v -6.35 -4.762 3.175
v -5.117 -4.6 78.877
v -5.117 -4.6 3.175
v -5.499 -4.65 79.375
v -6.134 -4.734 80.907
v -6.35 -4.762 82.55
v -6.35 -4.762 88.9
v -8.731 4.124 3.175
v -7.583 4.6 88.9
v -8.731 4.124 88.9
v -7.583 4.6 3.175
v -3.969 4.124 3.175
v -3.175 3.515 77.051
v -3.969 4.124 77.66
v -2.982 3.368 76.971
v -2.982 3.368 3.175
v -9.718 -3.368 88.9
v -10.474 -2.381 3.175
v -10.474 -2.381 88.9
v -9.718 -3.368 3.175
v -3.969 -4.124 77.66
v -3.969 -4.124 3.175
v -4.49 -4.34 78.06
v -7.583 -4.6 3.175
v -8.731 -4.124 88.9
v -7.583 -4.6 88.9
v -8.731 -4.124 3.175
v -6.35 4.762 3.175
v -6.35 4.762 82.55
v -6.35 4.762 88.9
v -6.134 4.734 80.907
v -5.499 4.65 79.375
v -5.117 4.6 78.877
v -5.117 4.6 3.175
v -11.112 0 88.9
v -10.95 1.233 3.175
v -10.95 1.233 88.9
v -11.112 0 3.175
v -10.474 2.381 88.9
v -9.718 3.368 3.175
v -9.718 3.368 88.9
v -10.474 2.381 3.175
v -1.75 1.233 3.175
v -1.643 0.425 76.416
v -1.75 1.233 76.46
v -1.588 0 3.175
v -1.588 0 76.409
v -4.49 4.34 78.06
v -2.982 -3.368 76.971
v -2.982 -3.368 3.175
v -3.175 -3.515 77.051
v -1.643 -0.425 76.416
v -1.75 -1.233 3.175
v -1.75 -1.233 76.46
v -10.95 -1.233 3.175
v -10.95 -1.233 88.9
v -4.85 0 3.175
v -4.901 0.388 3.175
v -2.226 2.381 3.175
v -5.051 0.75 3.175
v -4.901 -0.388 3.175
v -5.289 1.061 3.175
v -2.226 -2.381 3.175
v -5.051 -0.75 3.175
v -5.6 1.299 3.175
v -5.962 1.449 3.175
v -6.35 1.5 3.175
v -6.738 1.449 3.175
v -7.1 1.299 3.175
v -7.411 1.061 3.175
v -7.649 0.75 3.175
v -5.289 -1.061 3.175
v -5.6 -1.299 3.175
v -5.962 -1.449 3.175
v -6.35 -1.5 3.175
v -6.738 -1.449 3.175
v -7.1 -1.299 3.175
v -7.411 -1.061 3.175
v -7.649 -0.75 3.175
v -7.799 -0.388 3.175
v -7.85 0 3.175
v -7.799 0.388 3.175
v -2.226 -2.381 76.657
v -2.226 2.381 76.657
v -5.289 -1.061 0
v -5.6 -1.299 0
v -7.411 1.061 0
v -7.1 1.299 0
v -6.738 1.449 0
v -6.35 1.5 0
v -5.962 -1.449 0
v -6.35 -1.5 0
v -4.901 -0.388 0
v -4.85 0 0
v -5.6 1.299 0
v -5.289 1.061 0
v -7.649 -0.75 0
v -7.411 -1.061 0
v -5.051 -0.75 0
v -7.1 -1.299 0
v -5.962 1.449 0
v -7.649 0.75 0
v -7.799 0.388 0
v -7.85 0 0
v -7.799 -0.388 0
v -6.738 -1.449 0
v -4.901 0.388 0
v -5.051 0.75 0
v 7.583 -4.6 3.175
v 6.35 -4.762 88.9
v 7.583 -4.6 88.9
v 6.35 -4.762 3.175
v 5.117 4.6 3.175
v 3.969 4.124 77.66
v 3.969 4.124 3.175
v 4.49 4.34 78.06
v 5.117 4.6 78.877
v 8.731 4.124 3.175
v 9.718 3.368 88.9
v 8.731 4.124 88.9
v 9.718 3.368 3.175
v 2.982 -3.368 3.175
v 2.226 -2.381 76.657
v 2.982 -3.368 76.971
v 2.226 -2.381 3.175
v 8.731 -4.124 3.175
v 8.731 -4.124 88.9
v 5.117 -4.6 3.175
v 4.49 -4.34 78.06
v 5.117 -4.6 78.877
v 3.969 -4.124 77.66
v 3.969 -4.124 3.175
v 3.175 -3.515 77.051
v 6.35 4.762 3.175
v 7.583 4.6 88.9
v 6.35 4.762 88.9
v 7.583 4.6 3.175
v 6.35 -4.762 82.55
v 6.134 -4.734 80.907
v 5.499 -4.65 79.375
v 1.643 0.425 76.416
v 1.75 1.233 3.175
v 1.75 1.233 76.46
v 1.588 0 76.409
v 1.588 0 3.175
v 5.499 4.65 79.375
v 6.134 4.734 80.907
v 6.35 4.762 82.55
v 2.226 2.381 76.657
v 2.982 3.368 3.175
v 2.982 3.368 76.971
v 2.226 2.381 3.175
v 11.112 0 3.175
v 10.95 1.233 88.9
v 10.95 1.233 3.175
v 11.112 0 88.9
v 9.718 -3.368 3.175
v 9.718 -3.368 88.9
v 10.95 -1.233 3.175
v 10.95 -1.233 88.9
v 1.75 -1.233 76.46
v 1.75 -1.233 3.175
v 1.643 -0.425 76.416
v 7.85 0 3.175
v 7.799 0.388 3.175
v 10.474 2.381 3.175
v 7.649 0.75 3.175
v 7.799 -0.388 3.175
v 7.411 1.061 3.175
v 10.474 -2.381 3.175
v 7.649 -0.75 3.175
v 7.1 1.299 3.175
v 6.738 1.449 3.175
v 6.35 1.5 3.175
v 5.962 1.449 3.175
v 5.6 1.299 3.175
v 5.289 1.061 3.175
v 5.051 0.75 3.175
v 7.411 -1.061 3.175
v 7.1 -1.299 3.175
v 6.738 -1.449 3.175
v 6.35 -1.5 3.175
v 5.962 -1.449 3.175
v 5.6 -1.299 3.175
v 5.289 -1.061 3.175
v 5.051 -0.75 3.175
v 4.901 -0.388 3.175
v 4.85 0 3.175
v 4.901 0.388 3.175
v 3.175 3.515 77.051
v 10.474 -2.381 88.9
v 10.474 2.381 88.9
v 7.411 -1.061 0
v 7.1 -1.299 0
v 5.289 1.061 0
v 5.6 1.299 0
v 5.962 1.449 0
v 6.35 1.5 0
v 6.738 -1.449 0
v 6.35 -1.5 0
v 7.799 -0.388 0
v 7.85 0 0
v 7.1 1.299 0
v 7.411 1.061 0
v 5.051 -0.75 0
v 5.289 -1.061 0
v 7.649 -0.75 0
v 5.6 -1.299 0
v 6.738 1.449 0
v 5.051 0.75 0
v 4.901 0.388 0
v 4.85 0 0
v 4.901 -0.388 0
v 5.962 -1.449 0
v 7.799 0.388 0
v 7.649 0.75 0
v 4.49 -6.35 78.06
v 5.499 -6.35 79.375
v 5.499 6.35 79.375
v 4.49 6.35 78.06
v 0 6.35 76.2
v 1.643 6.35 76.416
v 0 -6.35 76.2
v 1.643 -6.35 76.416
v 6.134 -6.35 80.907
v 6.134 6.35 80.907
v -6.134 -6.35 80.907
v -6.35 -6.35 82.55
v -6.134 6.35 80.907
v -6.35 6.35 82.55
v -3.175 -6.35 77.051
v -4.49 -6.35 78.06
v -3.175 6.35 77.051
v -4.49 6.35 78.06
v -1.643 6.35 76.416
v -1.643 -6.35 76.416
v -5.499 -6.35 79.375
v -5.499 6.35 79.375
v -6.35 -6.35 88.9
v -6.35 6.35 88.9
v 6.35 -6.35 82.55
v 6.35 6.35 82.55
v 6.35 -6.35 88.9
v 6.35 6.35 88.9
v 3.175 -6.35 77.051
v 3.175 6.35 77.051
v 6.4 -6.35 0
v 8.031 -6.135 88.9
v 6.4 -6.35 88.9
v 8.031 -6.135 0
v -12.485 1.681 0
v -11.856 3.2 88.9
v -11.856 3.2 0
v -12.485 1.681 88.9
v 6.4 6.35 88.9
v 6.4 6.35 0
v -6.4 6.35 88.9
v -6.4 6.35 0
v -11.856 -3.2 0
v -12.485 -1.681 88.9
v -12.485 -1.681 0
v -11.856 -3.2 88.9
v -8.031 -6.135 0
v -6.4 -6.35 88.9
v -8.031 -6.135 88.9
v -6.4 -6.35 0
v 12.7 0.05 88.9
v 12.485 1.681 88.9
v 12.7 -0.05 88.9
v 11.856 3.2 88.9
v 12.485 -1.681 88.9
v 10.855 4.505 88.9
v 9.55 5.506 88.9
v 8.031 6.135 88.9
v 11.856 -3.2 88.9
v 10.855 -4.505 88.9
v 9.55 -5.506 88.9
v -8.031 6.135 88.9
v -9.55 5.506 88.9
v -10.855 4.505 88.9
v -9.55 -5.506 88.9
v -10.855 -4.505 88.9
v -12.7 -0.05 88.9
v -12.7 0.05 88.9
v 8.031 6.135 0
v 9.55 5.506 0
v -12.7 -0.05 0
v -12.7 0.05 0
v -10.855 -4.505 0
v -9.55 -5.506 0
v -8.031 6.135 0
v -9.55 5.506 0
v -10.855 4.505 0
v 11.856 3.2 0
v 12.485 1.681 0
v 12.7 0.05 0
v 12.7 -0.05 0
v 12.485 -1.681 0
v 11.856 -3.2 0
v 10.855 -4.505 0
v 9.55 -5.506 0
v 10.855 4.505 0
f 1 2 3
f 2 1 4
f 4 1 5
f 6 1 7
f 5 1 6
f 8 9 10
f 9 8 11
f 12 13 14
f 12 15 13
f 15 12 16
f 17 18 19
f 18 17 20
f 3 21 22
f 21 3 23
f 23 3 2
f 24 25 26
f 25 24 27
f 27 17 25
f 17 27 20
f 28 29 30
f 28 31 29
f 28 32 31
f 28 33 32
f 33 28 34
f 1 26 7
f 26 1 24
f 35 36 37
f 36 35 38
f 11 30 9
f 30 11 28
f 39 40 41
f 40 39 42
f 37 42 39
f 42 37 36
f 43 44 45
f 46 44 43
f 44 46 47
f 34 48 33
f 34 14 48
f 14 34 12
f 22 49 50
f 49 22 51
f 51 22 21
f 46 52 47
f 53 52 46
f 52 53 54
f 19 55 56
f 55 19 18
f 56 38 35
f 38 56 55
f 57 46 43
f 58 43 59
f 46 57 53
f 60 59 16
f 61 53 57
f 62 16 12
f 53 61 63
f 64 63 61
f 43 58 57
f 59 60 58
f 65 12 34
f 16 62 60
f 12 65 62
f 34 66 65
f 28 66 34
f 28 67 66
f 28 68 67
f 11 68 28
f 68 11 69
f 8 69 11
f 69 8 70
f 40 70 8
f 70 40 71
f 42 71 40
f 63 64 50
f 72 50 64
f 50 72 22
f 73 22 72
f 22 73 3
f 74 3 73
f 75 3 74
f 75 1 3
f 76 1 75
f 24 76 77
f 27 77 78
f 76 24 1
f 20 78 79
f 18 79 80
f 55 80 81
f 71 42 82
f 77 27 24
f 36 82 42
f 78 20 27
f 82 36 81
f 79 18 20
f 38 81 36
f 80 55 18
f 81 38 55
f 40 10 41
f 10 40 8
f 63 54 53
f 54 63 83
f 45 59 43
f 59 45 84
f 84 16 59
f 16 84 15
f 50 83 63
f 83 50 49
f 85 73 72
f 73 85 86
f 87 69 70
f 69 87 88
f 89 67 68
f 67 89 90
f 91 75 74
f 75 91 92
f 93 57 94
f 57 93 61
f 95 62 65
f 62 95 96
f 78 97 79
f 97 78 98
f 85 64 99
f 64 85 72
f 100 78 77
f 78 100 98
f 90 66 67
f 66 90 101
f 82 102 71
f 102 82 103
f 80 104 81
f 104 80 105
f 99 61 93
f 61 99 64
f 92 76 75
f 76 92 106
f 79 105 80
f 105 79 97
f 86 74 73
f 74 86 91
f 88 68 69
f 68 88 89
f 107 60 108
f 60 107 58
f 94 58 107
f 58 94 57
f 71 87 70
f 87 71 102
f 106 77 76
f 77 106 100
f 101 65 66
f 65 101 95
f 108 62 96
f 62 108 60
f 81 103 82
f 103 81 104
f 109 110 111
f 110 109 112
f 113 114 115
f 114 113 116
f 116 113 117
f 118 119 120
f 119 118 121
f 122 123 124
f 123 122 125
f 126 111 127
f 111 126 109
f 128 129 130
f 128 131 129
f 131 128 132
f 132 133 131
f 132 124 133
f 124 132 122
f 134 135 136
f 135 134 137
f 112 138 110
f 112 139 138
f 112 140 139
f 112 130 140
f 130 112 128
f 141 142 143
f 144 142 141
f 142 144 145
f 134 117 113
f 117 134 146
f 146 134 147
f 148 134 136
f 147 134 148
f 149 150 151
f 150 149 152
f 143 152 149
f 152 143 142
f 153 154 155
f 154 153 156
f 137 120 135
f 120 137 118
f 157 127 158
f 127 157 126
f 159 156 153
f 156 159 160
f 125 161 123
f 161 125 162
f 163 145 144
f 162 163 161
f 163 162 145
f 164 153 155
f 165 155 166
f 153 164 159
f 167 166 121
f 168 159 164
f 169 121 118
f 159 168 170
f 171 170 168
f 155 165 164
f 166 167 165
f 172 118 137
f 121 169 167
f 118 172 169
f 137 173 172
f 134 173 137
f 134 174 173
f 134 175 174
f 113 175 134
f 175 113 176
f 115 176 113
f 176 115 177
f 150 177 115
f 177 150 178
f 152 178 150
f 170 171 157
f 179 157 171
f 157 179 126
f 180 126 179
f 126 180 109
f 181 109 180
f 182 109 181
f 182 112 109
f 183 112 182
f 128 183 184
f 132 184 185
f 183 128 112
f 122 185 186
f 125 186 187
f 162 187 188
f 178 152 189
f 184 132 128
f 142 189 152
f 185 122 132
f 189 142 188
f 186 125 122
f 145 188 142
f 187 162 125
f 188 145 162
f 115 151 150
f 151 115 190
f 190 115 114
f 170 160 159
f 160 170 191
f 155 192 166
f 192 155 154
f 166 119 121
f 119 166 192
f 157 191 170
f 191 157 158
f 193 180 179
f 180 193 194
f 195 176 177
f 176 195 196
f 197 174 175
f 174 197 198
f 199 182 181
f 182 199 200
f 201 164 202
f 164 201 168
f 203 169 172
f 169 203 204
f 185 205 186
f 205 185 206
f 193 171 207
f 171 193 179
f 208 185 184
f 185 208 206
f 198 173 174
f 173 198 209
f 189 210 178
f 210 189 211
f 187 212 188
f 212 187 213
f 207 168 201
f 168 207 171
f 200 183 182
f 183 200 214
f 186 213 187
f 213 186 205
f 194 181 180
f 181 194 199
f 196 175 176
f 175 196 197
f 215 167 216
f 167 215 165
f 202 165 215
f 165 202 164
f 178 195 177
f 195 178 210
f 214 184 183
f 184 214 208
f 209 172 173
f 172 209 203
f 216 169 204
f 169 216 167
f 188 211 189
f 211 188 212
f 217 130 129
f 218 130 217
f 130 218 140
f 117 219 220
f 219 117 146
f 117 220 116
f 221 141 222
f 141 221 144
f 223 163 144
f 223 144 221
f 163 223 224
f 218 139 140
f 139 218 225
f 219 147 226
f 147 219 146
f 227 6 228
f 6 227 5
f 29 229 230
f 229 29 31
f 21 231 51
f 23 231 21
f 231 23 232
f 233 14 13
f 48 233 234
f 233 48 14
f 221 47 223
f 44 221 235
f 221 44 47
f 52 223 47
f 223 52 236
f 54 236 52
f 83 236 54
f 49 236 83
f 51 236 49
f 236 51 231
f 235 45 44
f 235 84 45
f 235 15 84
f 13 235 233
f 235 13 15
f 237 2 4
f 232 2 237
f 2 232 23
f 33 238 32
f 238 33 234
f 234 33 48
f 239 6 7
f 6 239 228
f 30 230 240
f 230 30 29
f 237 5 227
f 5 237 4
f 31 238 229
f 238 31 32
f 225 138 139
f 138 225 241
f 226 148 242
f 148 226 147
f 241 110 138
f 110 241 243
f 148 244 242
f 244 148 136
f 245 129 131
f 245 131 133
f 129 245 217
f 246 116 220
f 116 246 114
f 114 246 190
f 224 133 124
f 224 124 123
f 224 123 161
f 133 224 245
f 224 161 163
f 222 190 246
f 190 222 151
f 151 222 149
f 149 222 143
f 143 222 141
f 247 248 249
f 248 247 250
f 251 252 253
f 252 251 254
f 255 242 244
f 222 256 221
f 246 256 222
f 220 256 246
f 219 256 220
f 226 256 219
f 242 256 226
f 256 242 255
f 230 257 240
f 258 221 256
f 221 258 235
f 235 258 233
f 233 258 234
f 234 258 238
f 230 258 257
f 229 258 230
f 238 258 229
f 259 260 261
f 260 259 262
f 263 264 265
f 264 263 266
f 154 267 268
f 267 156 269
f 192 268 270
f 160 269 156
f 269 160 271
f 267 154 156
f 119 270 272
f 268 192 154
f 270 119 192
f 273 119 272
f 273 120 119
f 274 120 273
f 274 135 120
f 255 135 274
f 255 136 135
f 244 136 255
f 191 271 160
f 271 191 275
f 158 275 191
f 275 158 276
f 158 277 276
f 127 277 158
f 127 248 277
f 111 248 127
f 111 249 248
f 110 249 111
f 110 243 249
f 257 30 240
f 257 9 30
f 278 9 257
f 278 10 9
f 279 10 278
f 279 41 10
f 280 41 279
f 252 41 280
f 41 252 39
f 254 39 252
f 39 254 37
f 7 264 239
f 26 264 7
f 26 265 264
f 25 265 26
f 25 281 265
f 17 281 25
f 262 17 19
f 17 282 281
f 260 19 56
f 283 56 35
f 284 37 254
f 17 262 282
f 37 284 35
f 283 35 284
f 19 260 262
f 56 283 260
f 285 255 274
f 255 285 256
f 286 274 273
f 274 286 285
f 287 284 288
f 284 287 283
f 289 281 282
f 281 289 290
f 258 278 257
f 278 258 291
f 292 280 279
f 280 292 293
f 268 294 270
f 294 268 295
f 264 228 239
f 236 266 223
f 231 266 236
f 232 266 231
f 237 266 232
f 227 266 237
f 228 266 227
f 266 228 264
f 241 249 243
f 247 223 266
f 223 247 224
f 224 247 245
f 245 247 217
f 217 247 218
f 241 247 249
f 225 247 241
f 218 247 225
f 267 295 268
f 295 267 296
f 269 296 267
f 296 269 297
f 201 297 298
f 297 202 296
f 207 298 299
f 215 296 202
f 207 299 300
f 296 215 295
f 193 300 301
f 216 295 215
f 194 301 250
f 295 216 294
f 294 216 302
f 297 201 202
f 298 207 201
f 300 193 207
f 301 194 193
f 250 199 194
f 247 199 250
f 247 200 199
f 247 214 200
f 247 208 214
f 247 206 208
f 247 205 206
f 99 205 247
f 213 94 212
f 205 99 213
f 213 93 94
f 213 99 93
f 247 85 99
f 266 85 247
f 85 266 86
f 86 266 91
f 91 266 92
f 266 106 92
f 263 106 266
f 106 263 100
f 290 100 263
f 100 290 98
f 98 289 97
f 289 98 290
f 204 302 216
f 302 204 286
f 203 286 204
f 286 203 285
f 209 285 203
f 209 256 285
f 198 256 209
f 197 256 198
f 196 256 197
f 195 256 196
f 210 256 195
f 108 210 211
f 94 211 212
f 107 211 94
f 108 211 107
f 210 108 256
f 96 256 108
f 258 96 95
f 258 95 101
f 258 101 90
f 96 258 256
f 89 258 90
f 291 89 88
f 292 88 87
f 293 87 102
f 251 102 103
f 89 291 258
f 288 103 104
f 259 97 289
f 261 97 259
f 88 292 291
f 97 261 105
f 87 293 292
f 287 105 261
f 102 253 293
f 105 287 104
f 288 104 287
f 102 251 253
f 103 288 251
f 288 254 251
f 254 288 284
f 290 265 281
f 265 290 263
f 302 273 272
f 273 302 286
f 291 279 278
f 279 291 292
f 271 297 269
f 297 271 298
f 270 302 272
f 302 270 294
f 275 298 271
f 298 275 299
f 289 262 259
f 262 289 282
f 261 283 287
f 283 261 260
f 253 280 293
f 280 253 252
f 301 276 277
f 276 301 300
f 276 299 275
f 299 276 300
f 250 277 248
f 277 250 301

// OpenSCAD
// file: ../lib/TOGArrayLib1.scad
// TOGArrayLib1.4
// 
// Functions for working with arrays.
// 
// v1.1:
// - tal1_reduce assert(is_list(items)) to prevent infinite recursion
//   when given undefined or other non-list values
// v1.1.1:
// - Fix tal1_uniq_remap_v2 to return "list-remap-result" as the
//   first element of the returned list
// v1.2:
// - Add tal1_replace_at function
// v1.3:
// - tal1_is_vec_of, tal1_is_vec_of_num
// v1.4:
// - tal1_assert_for_each, for when you want to assert something
//   about each of a list of items and get nice failure messages

/**
 * Make a list with the contents of list `a`,
 * but starting at offset `off`, replaced by the contents of list `b`.
 * len(result) = max(len(a), off+len(b))
 */
function tal1_replace_at(a, off, b, default_value=undef, default_value_function=undef) =
	assert(is_list(a))
	assert(is_list(b))
	let( _dvf = !is_undef(default_value_function) ? default_value_function : function(i) default_value )
[
	for( i=[0:1:min(off,len(a))-1] ) a[i],
	for( i=[len(a):1:off-1] ) _dvf(i),
	for( i=[off:1:off+len(b)-1] ) b[i-off],
	for( i=[off+len(b):1:len(a)-1] ) a[i],
];

// Simplest case
assert([] == tal1_replace_at([], 0, []));
// Second simplest cases
assert(["foo"] == tal1_replace_at(["foo"], 0, []));
assert(["foo"] == tal1_replace_at([], 0, ["foo"]));
// Replace one item
assert(["foo","quux","baz"] == tal1_replace_at(["foo","bar","baz"], 1, ["quux"]));
// Replace and extend
assert(["foo","quux","tuna","tina"] == tal1_replace_at(["foo","bar","baz"], 1, ["quux", "tuna", "tina"]));
// Add beyond end of `a`
assert(["foo","zzz","quux"] == tal1_replace_at(["foo"], 2, ["quux"], default_value="zzz"));
// Adding 'nothing' should still fill to that point with defaults
assert(["foo","zzz","zzz"] == tal1_replace_at(["foo"], 3, [], default_value="zzz"));


function tal1_reduce(start, items, func, offset=0) =
	assert(is_list(items))
	len(items) == offset ? start :
	tal1_reduce(func(start, items[offset]), items, func, offset+1);

function tal1_consecutive_duplicate_count(items) = tal1_reduce(
	[0, undef],
	items,
	function(z,item) [z[0] + (item == z[1] ? 1 : 0), item]
)[0];

assert(0 == tal1_consecutive_duplicate_count([]));
assert(0 == tal1_consecutive_duplicate_count([50]));
assert(1 == tal1_consecutive_duplicate_count([50,50]));
assert(0 == tal1_consecutive_duplicate_count([50,51,52,53]));
assert(1 == tal1_consecutive_duplicate_count([50,51,52,52]));
assert(3 == tal1_consecutive_duplicate_count([50,50,50,50]));

// Set test_size to arbirarily large values
// to ensure that OpenSCAD can handle heavy recursion
let(test_size=1000) assert(test_size/2 == tal1_consecutive_duplicate_count([for(i=[0:1:test_size-1]) floor(i/2)]));



function tal1_uniq_(items, off0, off1) =
	let(chunklen = off1-off0)
	chunklen == 0 ? [] :
	chunklen == 1 ? [items[off0]] :
	let(half=floor(chunklen/2))
	let(left  = tal1_uniq_(items, off0     , off0+half))
	let(right = tal1_uniq_(items, off0+half, off1     ))
	assert(len(left) > 0)
	assert(len(right) > 0)
	left[len(left)-1] == right[0] ? [each left, for(i=[1:1:len(right)-1]) right[i]] :
	[each left, each right];

/** Given a list of items, returns a new list with identical consecutive items merged */
function tal1_uniq(items) = tal1_uniq_(items, 0, len(items));

assert([] == tal1_uniq([]));
assert([123] == tal1_uniq([123]));
assert([55,0,1,2,3] == tal1_uniq([55,0,1,2,3]));
assert([55,0,1,2] == tal1_uniq([55,0,1,1,2]));
assert([55,0,1] == tal1_uniq([55,55,0,0,0,0,0,0,1,1,1,1]));
assert([55,0] == tal1_uniq([55,0,0,0,0,0,0,0]));



/**
 * Returns [new items, old index -> new index mapping].
 * No-op version.
 */
function tal1_uniq_remap_v1(items) =
	["list-remap-result", items, [for (vi=[0:1:len(items)-1]) vi]];

// [a, a, b, b, c, c]
//
// [a,    ...], []  -> [a],[0]
// [a, a, ...], [0] -> [a],[0,0]

assert([1,2,3] == [1,2,3]);

/**
 * Recursive version that will combine adjacent identical vertexes,
 * but will use the original items.
 */
function tal1_uniq_remap_v2(items, map=[]) =
	let(index = len(map))
	len(items) == index ? ["list-remap-result", items, map] :
	index == 0 ? tal1_uniq_remap_v2(items, [0]) :
	items[index] == items[map[index-1]] ? tal1_uniq_remap_v2(items, [for(vi=map) vi, map[index-1]]) :
	tal1_uniq_remap_v2(items, [for(vi=map) vi, index]);

assert(tal1_uniq_remap_v2([1,1,2,2,3,4]) == ["list-remap-result", [1,1,2,2,3,4], [0,0,2,2,4,5]]);


/**
 * Returns true if `vec` is a list of at least min_len items
 * and component_check(each item, even those beyond min_len) is true.
 */
function tal1_is_vec_of(vec, min_len=0, component_check=function(x) true) =
	assert(is_num(min_len) && min_len >= 0)
	assert(is_function(component_check))
	is_list(vec) && len(vec) >= min_len &&
	tal1_reduce(true, vec, function(prev,item) prev && component_check(item));

function tal1_is_vec_of_num(vec, min_len=0) = tal1_is_vec_of(vec, min_len, function(i) is_num(i));

assert( true == tal1_is_vec_of_num([1,2,3]));
assert( true == tal1_is_vec_of_num([]));
assert( true == tal1_is_vec_of_num([1,2,3], 3));
assert(false == tal1_is_vec_of_num([1,2], 3));
assert(false == tal1_is_vec_of_num([1,2,"spoon"], 3));
// Requirements are ambiguous when
// first min_len items are numbers, but there are non-numeric items afterwards,
// so let's error on the side of saying 'no, it's not a list of numbers';
// i.e. the item check and the min_len are independent.
assert(false == tal1_is_vec_of_num([1,2,3,"artichoke"], 3));


/**
 * Asserts that item_checker(each item in list, index of item)[0] is true.
 * Second element of item_checker return value is assertion message.
 * Returns the original list, in case that's useful to you.
 */
function tal1_assert_for_each(list, item_checker) =
	let( _ignored = [ for(i=[0:1:len(list)-1])
		let(q=item_checker(list[i],i))
		let(passed=is_bool(q) ? q : is_list(q) ? q[0] : assert(false, str(
			"tal1_assert_for_each: item_checker should return Bool|[Bool,String], but returned ",
			q, " for item at index ", i)))
		let(message=is_list(q) ? q[1] : undef)
		assert(passed, message)
		q
	])
	list;

// Callback can return a boolean...
assert([1,2,3] == tal1_assert_for_each([1,2,3], function(v,i) is_num(v)));
// ...or a [boolean, string]
assert([1,2,3] == tal1_assert_for_each([1,2,3], function(v,i) [is_num(v), "element be a num"]));
// file: ../lib/TOGMod1Constructors.scad
// TOGMod1Constructors-v1.6
// 
// Functions to construct objects understood by TOGMod1
// 
// v1.1:
// - Add togmod1_make_rounded_rect
// v1.2:
// - togmod1_make_rounded_rect can make ovals
// v1.3:
// - togmod1_circle_points, to just get the points of a circle
// - if pos parameter to circle function has a third element,
//   returned vertexes will include it as the z component;
// v1.3.1
// - Some assertions
// v1.4:
// - Refactor togmod1_rounded_rect_points and togmod1_circle_points
//   to use togmod1__make_nd_vector_adder for adapting to whatever
//   `pos` parameter is.
// v1.5:
// - togmod_rounded_rect_points will not simplify completely rounded sides
//   (where length of side is exactly twice the rounding radius)
//   unless simplify_rounded_sides=true
//   - This makes it more useful for polyhedron generation,
//     where radius varies, but number of points must remain constant.
// v1.6:
// - togmod1_make_rect makes a simple rectangle
// - togmod1_make_rounded_rect will defer to togmod1_make_rect when r=0

use <./TOGArrayLib1.scad>

function togmod1__make_nd_vector_adder(origin=[0,0]) =
	let(origin_is_zero = tal1_reduce(true, origin, function(prev,item) prev && item == 0))
	origin_is_zero ? (function(vec) len(vec) >= len(origin) ? vec : tal1_replace_at(origin, 0, vec)) :
	function(vec) [
		for(i=[0:1:max(len(origin),len(vec))-1]) (len(vec) > i ? vec[i] : 0) + (len(origin) > i ? origin[i] : 0),
	];

assert([1,2,3] == togmod1__make_nd_vector_adder()([1,2,3]));
echo(togmod1__make_nd_vector_adder([0,0,3])([1,2]));
assert([1,2,3] == togmod1__make_nd_vector_adder([0,0,3])([1,2]));


function togmod1_make_cuboid(size) =
	assert(is_list(size))
	assert(len(size) >= 3)
	assert(is_num(size[0]))
	assert(is_num(size[1]))
	assert(is_num(size[2]))
	["polyhedron-vf", [
		[-size[0]/2, -size[1]/2, -size[2]/2],
		[+size[0]/2, -size[1]/2, -size[2]/2],
		[-size[0]/2, +size[1]/2, -size[2]/2],
		[+size[0]/2, +size[1]/2, -size[2]/2],
		[-size[0]/2, -size[1]/2, +size[2]/2],
		[+size[0]/2, -size[1]/2, +size[2]/2],
		[-size[0]/2, +size[1]/2, +size[2]/2],
		[+size[0]/2, +size[1]/2, +size[2]/2]
	], [
		[0,1,3,2],[0,4,5,1],[4,6,7,5],[3,7,6,2],[1,5,7,3],[6,4,0,2]
	]];

function togmod1_make_polygon(verts) =
	["polygon-vp", verts, [[for( i=[0:1:len(verts)-1] ) i%len(verts)]]];

function togmod1_rounded_rect_points(size, r, pos=[0,0], simplify_rounded_sides=false) =
	assert(is_list(size))
	assert(len(size) >= 2)
	let(radii = is_list(r) ? r : is_num(r) ? [r,r] : assert(false, "rounded_rect r(adius) should be list<num> or num"))
	let(rx = radii[0])
	let(ry = radii[1])
	assert(is_num(rx))
	assert(is_num(ry))
	assert(size[0] >= 2*rx, str("size[0] must be >= 2*r[0]; size[0] = ",size[0],", 2*r[0] = ",2*rx))
	assert(size[1] >= 2*ry, str("size[1] must be >= 2*r[1]; size[1] = ",size[1],", 2*r[1] = ",2*ry))
	let(quarterfn=max($fn/4, 1))
	let(qfnx = simplify_rounded_sides && size[0] == 2*rx ? quarterfn-1 : quarterfn)
	let(qfny = simplify_rounded_sides && size[1] == 2*ry ? quarterfn-1 : quarterfn)
	let(finalizepos = togmod1__make_nd_vector_adder(pos))
[
	for(a=[0 : 1 : qfnx]) let(ang=      a*90/quarterfn) finalizepos([ size[0]/2-rx + rx*cos(ang),  size[1]/2-ry + ry*sin(ang)]),
	for(a=[0 : 1 : qfny]) let(ang= 90 + a*90/quarterfn) finalizepos([-size[0]/2+rx + rx*cos(ang),  size[1]/2-ry + ry*sin(ang)]),
	for(a=[0 : 1 : qfnx]) let(ang=180 + a*90/quarterfn) finalizepos([-size[0]/2+rx + rx*cos(ang), -size[1]/2+ry + ry*sin(ang)]),
	for(a=[0 : 1 : qfny]) let(ang=270 + a*90/quarterfn) finalizepos([ size[0]/2-rx + rx*cos(ang), -size[1]/2+ry + ry*sin(ang)]),
];

function togmod1_make_rect(size) =
	togmod1_make_polygon([
		[-size[0]/2, -size[1]/2],
		[+size[0]/2, -size[1]/2],
		[+size[0]/2, +size[1]/2],
		[-size[0]/2, +size[1]/2],
	]);

function togmod1_make_rounded_rect(size, r) =
	r == 0 ? togmod1_make_rect(size) :
	togmod1_make_polygon(togmod1_rounded_rect_points(size,r,simplify_rounded_sides=true));

function togmod1_circle_points(r, pos=[0,0], d=undef) =
	assert( !is_undef(r) || !is_undef(d) )
	assert(!is_undef(pos[0]))
	assert(!is_undef(pos[1]))
	let(finalizepos = togmod1__make_nd_vector_adder(pos))
	let(r_ = !is_undef(r) ? r : d/2)
	let(fn = max($fn, 6))
	[for(i=[0 : 1 : fn-1]) finalizepos([r_*cos(i*360/fn), r_*sin(i*360/fn)])];

function togmod1_make_circle(r, pos=[0,0], d=undef) =
	togmod1_make_polygon(togmod1_circle_points(r=r, pos=pos, d=d));

function togmod1_make_cylinder(d, zrange=[0,1], r=undef, pos=[0,0]) =
	assert( !is_undef(r) || !is_undef(d) )
	let( r_ = !is_undef(r) ? r : d/2 )
	// TODO: Make polyhedron directly
	["linear-extrude-zs", zrange, togmod1_make_circle(r=r_, pos=pos)];

function togmod1__is_range1d(range) = is_list(range) && len(range) == 2 && is_num(range[0]) && is_num(range[1]);

function togmod1_linear_extrude_z(range, shape) =
	assert(togmod1__is_range1d(range))
	["linear-extrude-zs", range, shape];
function togmod1_linear_extrude_x(range, shape) =
	assert(togmod1__is_range1d(range))
	["rotate", [90, 0, 90], togmod1_linear_extrude_z(range, shape)];
function togmod1_linear_extrude_y(range, shape) =
	assert(togmod1__is_range1d(range))
	["rotate", [90, 0, 180], togmod1_linear_extrude_z(range, shape)];
// file: ../lib/TOGMod1.scad
// TOGMod1
// OpenSCAD library for representing shapes
// 
// See also: Functional OpenSCAD (https://github.com/thehans/FunctionalOpenSCAD)

module togmod1_domodule(mod) {
	assert(is_list(mod));
	assert(len(mod) > 0);
	if( mod[0] == "polygon-vp" ) {
		// ["polygon-vp", vertexes, paths]
		polygon(points=mod[1], paths=mod[2]);
	} else if( mod[0] == "polyhedron-vf" ) {
		polyhedron(mod[1], faces=mod[2]);
	} else if( mod[0] == "scale" ) {
		assert(len(mod) == 3);
		scale(mod[1]) togmod1_domodule(mod[2]);
	} else if( mod[0] == "translate" ) {
		assert(len(mod) == 3);
		assert(is_list(mod[1]));
		for(c=mod[1]) assert(is_num(c), "translate component should be numeric");
		translate(mod[1]) togmod1_domodule(mod[2]);
	} else if( mod[0] == "rotate" ) {
		assert(len(mod) == 3);
		rotate(mod[1]) togmod1_domodule(mod[2]);
	} else if( mod[0] == "intersection" ) {
		intersection_for( i=[1:1:len(mod)-1] ) togmod1_domodule(mod[i]);
	} else if( mod[0] == "difference" ) {
		difference() {
			togmod1_domodule(mod[1]);
			for( i=[2:1:len(mod)-1] ) togmod1_domodule(mod[i]);
		}
	} else if( mod[0] == "union" ) {
		for( i=[1:1:len(mod)-1] ) togmod1_domodule(mod[i]);
	} else if( mod[0] == "hull" ) {
		hull() for( i=[1:1:len(mod)-1] ) togmod1_domodule(mod[i]);
	} else if( mod[0] == "offset-rs" ) {
		assert(len(mod) == 3);
		assert(is_num(mod[1]));
		assert(is_list(mod[2]));
		offset(mod[1]) togmod1_domodule(mod[2]);
	} else if( mod[0] == "linear-extrude-zs" ) {
		// ["linear-extrude-zs", [z0,z1], 2d_shape] // centered
		// ["linear-extrude-zs", height, 2d_shape]
		let( zrange = is_list(mod[1]) ? mod[1] : [-mod[1]/2, mod[1]/2] ) {
			translate([0,0,zrange[0]]) linear_extrude(zrange[1]-zrange[0]) togmod1_domodule(mod[2]);
		}
	} else if( mod[0] == "render" ) {
		render() togmod1_domodule(mod[1]);
	} else if( mod[0] == "minkowski" ) {
		minkowski() {
			togmod1_domodule(mod[1]);
			togmod1_domodule(mod[2]);
		}
	} else if( mod[0] == "x-debug" ) {
		# togmod1_domodule(mod[1]);
	} else {
		assert(false, str("Unrecognized shape: ", mod[0]));
	}
}
// main file
// CigaretteHolder1.0
// 
// These Lucky Leaf ones are about 3+5/16" long and 5/16" in diameter

module __cigaretteholder1__end_params() { }

inch = 25.4;

cig_hole_dameter = 3/8*inch;
cig_hole_depth = (3+6/16)*inch;
height = (3+1/2)*inch;

$fn = 24;

use <../lib/TOGMod1.scad>
use <../lib/TOGMod1Constructors.scad>

cig_hole = ["union",
	togmod1_linear_extrude_z([-cig_hole_depth, 1], togmod1_make_circle(d=cig_hole_dameter)),
	togmod1_linear_extrude_z([-cig_hole_depth-10, 0], togmod1_make_circle(d=3)),
];

finger_notch = togmod1_linear_extrude_y([-1*inch, +1*inch], togmod1_make_rounded_rect([0.5*inch, 1*inch], r=0.25*inch));

togmod1_domodule(["difference",
	togmod1_linear_extrude_z([0, height], togmod1_make_rounded_rect([1*inch, 0.5*inch], r=6.3)),
	["translate", [-0.25*inch, 0, height], cig_hole],
	["translate", [ 0.25*inch, 0, height], cig_hole],
	["translate", [         0, 0, height], finger_notch],
]);
